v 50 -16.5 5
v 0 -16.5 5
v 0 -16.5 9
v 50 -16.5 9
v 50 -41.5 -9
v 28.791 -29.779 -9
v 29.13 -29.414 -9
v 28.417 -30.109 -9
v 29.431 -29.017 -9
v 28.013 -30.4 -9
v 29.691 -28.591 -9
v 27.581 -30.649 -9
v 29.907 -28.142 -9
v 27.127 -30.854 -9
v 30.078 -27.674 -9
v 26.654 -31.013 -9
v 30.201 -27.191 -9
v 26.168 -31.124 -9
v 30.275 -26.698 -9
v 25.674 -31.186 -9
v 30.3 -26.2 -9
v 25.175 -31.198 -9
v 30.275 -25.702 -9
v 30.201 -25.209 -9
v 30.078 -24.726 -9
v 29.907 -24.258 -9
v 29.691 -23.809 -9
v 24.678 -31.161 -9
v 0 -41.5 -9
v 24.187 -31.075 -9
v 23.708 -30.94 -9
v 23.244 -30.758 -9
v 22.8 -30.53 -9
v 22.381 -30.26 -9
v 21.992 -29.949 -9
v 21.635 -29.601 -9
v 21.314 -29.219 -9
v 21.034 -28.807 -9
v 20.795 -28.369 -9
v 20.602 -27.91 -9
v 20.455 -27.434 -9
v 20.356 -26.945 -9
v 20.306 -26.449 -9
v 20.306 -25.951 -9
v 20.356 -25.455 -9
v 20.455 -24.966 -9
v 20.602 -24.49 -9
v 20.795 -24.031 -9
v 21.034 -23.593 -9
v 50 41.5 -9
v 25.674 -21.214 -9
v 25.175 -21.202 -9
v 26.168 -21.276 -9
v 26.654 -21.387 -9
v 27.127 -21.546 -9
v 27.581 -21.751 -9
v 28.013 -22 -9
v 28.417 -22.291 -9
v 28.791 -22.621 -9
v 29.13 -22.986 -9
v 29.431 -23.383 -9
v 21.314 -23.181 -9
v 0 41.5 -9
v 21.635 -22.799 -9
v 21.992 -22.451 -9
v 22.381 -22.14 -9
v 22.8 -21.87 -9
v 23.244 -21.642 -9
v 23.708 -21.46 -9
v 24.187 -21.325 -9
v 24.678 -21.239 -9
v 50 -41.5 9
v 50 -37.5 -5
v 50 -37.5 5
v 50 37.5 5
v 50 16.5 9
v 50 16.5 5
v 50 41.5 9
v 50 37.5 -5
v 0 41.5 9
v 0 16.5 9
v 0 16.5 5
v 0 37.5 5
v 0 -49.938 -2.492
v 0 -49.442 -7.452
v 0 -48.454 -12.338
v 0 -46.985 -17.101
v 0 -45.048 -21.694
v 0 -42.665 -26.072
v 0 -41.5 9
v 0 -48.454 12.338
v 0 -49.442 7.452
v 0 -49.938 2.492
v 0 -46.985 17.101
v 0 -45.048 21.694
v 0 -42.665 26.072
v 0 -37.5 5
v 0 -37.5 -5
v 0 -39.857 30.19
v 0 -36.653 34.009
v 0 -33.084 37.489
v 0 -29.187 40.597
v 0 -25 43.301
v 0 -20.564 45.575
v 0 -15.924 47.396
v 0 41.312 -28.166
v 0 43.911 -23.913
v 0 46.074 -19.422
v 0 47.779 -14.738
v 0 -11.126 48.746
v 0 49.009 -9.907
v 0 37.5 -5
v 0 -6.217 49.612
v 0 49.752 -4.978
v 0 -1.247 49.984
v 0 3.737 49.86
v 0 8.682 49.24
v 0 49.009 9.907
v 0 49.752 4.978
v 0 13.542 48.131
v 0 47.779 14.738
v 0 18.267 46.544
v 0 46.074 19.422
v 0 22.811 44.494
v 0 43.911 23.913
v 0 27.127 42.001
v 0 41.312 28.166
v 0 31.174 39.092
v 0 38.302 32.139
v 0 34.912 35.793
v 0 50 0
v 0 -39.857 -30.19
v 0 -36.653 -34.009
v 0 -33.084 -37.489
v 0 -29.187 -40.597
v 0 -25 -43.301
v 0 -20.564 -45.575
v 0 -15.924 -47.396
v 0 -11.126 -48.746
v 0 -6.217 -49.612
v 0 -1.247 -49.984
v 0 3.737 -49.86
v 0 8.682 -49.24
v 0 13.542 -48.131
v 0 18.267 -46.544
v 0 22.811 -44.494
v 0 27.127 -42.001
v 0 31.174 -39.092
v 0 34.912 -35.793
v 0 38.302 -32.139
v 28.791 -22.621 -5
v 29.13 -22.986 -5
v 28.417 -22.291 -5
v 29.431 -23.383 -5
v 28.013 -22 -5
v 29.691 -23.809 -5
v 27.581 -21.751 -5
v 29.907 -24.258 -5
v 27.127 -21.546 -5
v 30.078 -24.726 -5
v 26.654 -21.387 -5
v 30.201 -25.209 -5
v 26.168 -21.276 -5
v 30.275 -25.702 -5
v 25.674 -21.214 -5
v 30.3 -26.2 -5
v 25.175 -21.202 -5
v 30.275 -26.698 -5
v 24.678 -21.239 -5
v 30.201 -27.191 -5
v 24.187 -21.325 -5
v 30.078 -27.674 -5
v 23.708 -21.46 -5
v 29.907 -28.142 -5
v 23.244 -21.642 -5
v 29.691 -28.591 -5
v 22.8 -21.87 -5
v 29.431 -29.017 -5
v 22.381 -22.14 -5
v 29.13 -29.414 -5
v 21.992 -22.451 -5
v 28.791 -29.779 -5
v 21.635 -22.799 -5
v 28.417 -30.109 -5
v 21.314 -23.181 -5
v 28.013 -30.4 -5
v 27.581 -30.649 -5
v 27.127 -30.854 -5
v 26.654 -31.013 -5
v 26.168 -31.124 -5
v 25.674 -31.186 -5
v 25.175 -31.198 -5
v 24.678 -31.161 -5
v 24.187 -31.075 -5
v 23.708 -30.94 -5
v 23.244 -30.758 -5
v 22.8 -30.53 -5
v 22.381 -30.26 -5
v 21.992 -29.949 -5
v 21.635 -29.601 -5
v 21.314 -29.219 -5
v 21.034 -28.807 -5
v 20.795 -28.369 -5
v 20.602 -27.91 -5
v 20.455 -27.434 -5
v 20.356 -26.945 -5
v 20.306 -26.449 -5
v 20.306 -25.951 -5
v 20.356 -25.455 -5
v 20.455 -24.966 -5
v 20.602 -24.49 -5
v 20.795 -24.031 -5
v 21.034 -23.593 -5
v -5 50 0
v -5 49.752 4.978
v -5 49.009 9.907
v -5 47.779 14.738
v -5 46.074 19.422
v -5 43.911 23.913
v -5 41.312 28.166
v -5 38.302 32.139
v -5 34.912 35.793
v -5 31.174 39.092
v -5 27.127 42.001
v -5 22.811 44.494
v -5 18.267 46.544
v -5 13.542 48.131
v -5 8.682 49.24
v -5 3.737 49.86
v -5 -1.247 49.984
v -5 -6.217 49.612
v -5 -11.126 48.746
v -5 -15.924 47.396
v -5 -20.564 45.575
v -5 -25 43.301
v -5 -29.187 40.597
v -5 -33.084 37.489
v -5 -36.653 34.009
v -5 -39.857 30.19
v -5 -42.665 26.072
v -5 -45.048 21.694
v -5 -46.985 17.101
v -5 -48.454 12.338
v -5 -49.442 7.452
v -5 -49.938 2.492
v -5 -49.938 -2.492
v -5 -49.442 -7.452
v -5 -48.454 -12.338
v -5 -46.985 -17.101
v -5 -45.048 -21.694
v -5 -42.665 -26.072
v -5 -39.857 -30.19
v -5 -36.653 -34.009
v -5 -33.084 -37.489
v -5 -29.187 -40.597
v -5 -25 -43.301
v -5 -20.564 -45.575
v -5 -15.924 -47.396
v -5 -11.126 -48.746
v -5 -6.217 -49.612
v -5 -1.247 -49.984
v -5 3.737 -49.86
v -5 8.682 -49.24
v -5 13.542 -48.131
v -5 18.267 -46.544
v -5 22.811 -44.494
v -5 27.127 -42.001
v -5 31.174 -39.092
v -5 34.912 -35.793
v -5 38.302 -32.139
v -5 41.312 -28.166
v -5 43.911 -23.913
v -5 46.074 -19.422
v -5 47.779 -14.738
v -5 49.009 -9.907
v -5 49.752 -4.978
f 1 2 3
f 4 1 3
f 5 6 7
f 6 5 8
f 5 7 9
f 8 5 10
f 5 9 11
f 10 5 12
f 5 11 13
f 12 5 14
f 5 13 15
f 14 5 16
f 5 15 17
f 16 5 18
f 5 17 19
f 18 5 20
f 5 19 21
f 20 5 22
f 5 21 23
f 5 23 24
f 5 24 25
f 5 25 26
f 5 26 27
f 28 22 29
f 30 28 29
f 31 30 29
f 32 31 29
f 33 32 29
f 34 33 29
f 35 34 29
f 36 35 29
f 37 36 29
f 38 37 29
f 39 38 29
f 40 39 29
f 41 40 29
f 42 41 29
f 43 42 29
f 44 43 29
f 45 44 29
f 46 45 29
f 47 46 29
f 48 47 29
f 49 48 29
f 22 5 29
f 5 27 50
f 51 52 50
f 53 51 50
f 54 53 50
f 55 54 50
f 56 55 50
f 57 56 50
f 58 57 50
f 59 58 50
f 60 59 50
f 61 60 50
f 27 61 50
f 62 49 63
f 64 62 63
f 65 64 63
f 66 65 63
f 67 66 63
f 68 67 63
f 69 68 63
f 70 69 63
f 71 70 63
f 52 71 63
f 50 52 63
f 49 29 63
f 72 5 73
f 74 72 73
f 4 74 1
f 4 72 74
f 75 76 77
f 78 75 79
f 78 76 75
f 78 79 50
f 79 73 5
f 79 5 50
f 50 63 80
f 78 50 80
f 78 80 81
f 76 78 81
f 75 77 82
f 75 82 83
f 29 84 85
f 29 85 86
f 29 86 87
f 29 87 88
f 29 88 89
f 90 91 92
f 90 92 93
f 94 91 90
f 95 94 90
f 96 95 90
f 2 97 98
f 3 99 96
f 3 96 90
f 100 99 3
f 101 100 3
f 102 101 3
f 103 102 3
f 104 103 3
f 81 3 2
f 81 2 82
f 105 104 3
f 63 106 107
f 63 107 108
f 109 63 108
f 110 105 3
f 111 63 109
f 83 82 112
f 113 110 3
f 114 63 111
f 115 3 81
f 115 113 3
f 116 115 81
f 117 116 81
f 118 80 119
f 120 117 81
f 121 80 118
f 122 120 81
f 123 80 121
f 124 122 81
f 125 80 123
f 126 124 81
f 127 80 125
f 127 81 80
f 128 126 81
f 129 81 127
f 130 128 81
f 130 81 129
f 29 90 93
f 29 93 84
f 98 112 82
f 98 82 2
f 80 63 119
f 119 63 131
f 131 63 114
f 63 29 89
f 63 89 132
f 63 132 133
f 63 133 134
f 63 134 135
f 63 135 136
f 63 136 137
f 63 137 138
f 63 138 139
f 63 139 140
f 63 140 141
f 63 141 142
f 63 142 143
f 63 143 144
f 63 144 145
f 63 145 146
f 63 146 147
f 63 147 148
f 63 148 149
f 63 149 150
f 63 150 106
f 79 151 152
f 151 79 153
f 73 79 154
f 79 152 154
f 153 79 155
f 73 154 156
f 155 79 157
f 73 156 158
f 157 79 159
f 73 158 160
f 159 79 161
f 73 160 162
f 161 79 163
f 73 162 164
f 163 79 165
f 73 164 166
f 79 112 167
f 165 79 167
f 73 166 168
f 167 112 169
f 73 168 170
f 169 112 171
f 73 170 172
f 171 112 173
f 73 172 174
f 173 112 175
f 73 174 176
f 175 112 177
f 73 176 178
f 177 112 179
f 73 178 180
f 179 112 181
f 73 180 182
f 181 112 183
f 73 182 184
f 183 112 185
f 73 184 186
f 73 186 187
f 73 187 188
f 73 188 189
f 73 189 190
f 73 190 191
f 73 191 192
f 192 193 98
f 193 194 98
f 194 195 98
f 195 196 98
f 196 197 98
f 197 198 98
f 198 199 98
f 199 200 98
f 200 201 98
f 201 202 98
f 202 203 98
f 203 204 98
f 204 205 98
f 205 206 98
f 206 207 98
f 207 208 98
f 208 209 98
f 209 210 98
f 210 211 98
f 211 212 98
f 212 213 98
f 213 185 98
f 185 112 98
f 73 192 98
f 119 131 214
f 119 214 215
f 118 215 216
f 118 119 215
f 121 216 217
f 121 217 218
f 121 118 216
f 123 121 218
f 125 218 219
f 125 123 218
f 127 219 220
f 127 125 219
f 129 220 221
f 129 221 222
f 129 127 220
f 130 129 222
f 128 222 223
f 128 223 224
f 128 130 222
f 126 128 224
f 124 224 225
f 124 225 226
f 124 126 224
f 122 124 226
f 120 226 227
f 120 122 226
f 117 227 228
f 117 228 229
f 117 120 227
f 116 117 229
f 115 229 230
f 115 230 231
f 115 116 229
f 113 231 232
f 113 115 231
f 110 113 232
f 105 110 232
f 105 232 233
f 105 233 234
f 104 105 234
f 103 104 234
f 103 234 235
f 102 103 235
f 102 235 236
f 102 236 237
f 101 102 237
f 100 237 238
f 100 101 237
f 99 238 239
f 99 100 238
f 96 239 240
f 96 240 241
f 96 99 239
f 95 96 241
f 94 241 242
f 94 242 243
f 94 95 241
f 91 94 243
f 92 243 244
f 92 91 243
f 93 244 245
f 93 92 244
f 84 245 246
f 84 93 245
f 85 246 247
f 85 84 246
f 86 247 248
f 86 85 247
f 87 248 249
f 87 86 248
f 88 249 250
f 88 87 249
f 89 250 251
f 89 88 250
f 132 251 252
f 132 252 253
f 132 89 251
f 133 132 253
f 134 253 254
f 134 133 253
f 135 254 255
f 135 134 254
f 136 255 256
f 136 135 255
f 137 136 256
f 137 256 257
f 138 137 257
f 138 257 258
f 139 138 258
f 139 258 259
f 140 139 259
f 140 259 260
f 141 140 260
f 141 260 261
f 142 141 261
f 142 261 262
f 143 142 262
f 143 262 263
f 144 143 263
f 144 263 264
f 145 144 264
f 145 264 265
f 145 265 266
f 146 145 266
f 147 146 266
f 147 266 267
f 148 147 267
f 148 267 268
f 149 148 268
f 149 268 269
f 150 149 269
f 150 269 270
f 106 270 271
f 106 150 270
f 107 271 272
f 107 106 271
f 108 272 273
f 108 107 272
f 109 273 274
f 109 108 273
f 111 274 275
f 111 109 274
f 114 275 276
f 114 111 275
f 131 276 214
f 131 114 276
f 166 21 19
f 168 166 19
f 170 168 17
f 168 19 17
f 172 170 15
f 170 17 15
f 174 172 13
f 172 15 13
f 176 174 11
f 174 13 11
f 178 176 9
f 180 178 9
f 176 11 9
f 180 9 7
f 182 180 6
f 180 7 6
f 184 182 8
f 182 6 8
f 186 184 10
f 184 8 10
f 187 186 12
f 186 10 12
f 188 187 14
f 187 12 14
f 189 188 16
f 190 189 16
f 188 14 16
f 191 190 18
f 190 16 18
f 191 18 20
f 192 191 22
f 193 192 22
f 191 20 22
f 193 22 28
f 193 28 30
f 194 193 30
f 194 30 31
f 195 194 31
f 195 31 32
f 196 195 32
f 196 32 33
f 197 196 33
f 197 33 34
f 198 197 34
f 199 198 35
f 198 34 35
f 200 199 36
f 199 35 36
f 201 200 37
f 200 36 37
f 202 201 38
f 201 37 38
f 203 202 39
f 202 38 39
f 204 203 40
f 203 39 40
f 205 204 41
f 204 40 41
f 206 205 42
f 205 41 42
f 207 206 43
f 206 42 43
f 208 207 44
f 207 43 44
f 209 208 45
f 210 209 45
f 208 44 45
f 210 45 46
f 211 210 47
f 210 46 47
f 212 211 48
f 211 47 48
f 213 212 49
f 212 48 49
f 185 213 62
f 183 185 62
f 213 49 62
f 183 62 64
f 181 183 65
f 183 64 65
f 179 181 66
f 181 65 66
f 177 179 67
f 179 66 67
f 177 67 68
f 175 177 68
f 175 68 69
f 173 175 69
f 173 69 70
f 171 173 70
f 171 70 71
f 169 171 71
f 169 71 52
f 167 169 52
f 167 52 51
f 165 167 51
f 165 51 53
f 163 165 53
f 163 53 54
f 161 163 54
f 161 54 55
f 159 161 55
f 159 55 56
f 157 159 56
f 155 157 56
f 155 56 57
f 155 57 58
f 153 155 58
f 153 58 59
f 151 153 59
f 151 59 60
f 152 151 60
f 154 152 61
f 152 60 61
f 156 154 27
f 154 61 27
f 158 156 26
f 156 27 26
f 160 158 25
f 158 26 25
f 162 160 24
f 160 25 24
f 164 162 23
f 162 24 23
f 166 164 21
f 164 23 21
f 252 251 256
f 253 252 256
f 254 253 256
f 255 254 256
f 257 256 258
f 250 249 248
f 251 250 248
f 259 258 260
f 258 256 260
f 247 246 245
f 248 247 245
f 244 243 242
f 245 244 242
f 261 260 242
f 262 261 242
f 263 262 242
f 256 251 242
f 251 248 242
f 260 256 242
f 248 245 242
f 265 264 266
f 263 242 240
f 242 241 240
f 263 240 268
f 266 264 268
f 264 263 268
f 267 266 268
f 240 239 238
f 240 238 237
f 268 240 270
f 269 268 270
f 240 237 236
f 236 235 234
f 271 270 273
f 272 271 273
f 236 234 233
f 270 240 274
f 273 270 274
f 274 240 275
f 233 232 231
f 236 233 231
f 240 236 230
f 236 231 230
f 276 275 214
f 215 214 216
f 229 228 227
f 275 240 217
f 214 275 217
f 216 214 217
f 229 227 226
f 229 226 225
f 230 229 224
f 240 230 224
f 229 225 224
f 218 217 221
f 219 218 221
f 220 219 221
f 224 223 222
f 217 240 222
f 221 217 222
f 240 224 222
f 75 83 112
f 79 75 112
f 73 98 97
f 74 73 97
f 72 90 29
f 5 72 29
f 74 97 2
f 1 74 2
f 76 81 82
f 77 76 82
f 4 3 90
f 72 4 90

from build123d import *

# Parameters (mm, degrees)
F0_R     = 50
F1_DEPTH = 5
F3_DEPTH = 50
F4_R     = 5
F5_DEPTH = 4


with BuildPart() as f1:
    # F0 (on Right) → F1 (new body)
    with BuildSketch(Plane.YZ):
        Circle(F0_R)
    extrude(amount=-F1_DEPTH)

    # F2 (on Right) → F3 (join)
    with BuildSketch(Plane.YZ):
        Polygon((-41.5, 9), (-41.5, -9), (41.5, -9), (41.5, 9), (16.5, 9), (16.5, 5), (37.5, 5), (37.5, -5), (-37.5, -5), (-37.5, 5), (-16.5, 5), (-16.5, 9), align=None)
    extrude(amount=F3_DEPTH)

    # F4 (on face) → F5 (cut, through all)
    with BuildSketch(Plane(origin=(0, 0, -9), x_dir=(1, 0, 0), z_dir=(0, 0, -1))):
        with Locations((25.3, 26.2)):
            Circle(F4_R)
    extrude(amount=-F5_DEPTH, mode=Mode.SUBTRACT)


solid = f1.part
